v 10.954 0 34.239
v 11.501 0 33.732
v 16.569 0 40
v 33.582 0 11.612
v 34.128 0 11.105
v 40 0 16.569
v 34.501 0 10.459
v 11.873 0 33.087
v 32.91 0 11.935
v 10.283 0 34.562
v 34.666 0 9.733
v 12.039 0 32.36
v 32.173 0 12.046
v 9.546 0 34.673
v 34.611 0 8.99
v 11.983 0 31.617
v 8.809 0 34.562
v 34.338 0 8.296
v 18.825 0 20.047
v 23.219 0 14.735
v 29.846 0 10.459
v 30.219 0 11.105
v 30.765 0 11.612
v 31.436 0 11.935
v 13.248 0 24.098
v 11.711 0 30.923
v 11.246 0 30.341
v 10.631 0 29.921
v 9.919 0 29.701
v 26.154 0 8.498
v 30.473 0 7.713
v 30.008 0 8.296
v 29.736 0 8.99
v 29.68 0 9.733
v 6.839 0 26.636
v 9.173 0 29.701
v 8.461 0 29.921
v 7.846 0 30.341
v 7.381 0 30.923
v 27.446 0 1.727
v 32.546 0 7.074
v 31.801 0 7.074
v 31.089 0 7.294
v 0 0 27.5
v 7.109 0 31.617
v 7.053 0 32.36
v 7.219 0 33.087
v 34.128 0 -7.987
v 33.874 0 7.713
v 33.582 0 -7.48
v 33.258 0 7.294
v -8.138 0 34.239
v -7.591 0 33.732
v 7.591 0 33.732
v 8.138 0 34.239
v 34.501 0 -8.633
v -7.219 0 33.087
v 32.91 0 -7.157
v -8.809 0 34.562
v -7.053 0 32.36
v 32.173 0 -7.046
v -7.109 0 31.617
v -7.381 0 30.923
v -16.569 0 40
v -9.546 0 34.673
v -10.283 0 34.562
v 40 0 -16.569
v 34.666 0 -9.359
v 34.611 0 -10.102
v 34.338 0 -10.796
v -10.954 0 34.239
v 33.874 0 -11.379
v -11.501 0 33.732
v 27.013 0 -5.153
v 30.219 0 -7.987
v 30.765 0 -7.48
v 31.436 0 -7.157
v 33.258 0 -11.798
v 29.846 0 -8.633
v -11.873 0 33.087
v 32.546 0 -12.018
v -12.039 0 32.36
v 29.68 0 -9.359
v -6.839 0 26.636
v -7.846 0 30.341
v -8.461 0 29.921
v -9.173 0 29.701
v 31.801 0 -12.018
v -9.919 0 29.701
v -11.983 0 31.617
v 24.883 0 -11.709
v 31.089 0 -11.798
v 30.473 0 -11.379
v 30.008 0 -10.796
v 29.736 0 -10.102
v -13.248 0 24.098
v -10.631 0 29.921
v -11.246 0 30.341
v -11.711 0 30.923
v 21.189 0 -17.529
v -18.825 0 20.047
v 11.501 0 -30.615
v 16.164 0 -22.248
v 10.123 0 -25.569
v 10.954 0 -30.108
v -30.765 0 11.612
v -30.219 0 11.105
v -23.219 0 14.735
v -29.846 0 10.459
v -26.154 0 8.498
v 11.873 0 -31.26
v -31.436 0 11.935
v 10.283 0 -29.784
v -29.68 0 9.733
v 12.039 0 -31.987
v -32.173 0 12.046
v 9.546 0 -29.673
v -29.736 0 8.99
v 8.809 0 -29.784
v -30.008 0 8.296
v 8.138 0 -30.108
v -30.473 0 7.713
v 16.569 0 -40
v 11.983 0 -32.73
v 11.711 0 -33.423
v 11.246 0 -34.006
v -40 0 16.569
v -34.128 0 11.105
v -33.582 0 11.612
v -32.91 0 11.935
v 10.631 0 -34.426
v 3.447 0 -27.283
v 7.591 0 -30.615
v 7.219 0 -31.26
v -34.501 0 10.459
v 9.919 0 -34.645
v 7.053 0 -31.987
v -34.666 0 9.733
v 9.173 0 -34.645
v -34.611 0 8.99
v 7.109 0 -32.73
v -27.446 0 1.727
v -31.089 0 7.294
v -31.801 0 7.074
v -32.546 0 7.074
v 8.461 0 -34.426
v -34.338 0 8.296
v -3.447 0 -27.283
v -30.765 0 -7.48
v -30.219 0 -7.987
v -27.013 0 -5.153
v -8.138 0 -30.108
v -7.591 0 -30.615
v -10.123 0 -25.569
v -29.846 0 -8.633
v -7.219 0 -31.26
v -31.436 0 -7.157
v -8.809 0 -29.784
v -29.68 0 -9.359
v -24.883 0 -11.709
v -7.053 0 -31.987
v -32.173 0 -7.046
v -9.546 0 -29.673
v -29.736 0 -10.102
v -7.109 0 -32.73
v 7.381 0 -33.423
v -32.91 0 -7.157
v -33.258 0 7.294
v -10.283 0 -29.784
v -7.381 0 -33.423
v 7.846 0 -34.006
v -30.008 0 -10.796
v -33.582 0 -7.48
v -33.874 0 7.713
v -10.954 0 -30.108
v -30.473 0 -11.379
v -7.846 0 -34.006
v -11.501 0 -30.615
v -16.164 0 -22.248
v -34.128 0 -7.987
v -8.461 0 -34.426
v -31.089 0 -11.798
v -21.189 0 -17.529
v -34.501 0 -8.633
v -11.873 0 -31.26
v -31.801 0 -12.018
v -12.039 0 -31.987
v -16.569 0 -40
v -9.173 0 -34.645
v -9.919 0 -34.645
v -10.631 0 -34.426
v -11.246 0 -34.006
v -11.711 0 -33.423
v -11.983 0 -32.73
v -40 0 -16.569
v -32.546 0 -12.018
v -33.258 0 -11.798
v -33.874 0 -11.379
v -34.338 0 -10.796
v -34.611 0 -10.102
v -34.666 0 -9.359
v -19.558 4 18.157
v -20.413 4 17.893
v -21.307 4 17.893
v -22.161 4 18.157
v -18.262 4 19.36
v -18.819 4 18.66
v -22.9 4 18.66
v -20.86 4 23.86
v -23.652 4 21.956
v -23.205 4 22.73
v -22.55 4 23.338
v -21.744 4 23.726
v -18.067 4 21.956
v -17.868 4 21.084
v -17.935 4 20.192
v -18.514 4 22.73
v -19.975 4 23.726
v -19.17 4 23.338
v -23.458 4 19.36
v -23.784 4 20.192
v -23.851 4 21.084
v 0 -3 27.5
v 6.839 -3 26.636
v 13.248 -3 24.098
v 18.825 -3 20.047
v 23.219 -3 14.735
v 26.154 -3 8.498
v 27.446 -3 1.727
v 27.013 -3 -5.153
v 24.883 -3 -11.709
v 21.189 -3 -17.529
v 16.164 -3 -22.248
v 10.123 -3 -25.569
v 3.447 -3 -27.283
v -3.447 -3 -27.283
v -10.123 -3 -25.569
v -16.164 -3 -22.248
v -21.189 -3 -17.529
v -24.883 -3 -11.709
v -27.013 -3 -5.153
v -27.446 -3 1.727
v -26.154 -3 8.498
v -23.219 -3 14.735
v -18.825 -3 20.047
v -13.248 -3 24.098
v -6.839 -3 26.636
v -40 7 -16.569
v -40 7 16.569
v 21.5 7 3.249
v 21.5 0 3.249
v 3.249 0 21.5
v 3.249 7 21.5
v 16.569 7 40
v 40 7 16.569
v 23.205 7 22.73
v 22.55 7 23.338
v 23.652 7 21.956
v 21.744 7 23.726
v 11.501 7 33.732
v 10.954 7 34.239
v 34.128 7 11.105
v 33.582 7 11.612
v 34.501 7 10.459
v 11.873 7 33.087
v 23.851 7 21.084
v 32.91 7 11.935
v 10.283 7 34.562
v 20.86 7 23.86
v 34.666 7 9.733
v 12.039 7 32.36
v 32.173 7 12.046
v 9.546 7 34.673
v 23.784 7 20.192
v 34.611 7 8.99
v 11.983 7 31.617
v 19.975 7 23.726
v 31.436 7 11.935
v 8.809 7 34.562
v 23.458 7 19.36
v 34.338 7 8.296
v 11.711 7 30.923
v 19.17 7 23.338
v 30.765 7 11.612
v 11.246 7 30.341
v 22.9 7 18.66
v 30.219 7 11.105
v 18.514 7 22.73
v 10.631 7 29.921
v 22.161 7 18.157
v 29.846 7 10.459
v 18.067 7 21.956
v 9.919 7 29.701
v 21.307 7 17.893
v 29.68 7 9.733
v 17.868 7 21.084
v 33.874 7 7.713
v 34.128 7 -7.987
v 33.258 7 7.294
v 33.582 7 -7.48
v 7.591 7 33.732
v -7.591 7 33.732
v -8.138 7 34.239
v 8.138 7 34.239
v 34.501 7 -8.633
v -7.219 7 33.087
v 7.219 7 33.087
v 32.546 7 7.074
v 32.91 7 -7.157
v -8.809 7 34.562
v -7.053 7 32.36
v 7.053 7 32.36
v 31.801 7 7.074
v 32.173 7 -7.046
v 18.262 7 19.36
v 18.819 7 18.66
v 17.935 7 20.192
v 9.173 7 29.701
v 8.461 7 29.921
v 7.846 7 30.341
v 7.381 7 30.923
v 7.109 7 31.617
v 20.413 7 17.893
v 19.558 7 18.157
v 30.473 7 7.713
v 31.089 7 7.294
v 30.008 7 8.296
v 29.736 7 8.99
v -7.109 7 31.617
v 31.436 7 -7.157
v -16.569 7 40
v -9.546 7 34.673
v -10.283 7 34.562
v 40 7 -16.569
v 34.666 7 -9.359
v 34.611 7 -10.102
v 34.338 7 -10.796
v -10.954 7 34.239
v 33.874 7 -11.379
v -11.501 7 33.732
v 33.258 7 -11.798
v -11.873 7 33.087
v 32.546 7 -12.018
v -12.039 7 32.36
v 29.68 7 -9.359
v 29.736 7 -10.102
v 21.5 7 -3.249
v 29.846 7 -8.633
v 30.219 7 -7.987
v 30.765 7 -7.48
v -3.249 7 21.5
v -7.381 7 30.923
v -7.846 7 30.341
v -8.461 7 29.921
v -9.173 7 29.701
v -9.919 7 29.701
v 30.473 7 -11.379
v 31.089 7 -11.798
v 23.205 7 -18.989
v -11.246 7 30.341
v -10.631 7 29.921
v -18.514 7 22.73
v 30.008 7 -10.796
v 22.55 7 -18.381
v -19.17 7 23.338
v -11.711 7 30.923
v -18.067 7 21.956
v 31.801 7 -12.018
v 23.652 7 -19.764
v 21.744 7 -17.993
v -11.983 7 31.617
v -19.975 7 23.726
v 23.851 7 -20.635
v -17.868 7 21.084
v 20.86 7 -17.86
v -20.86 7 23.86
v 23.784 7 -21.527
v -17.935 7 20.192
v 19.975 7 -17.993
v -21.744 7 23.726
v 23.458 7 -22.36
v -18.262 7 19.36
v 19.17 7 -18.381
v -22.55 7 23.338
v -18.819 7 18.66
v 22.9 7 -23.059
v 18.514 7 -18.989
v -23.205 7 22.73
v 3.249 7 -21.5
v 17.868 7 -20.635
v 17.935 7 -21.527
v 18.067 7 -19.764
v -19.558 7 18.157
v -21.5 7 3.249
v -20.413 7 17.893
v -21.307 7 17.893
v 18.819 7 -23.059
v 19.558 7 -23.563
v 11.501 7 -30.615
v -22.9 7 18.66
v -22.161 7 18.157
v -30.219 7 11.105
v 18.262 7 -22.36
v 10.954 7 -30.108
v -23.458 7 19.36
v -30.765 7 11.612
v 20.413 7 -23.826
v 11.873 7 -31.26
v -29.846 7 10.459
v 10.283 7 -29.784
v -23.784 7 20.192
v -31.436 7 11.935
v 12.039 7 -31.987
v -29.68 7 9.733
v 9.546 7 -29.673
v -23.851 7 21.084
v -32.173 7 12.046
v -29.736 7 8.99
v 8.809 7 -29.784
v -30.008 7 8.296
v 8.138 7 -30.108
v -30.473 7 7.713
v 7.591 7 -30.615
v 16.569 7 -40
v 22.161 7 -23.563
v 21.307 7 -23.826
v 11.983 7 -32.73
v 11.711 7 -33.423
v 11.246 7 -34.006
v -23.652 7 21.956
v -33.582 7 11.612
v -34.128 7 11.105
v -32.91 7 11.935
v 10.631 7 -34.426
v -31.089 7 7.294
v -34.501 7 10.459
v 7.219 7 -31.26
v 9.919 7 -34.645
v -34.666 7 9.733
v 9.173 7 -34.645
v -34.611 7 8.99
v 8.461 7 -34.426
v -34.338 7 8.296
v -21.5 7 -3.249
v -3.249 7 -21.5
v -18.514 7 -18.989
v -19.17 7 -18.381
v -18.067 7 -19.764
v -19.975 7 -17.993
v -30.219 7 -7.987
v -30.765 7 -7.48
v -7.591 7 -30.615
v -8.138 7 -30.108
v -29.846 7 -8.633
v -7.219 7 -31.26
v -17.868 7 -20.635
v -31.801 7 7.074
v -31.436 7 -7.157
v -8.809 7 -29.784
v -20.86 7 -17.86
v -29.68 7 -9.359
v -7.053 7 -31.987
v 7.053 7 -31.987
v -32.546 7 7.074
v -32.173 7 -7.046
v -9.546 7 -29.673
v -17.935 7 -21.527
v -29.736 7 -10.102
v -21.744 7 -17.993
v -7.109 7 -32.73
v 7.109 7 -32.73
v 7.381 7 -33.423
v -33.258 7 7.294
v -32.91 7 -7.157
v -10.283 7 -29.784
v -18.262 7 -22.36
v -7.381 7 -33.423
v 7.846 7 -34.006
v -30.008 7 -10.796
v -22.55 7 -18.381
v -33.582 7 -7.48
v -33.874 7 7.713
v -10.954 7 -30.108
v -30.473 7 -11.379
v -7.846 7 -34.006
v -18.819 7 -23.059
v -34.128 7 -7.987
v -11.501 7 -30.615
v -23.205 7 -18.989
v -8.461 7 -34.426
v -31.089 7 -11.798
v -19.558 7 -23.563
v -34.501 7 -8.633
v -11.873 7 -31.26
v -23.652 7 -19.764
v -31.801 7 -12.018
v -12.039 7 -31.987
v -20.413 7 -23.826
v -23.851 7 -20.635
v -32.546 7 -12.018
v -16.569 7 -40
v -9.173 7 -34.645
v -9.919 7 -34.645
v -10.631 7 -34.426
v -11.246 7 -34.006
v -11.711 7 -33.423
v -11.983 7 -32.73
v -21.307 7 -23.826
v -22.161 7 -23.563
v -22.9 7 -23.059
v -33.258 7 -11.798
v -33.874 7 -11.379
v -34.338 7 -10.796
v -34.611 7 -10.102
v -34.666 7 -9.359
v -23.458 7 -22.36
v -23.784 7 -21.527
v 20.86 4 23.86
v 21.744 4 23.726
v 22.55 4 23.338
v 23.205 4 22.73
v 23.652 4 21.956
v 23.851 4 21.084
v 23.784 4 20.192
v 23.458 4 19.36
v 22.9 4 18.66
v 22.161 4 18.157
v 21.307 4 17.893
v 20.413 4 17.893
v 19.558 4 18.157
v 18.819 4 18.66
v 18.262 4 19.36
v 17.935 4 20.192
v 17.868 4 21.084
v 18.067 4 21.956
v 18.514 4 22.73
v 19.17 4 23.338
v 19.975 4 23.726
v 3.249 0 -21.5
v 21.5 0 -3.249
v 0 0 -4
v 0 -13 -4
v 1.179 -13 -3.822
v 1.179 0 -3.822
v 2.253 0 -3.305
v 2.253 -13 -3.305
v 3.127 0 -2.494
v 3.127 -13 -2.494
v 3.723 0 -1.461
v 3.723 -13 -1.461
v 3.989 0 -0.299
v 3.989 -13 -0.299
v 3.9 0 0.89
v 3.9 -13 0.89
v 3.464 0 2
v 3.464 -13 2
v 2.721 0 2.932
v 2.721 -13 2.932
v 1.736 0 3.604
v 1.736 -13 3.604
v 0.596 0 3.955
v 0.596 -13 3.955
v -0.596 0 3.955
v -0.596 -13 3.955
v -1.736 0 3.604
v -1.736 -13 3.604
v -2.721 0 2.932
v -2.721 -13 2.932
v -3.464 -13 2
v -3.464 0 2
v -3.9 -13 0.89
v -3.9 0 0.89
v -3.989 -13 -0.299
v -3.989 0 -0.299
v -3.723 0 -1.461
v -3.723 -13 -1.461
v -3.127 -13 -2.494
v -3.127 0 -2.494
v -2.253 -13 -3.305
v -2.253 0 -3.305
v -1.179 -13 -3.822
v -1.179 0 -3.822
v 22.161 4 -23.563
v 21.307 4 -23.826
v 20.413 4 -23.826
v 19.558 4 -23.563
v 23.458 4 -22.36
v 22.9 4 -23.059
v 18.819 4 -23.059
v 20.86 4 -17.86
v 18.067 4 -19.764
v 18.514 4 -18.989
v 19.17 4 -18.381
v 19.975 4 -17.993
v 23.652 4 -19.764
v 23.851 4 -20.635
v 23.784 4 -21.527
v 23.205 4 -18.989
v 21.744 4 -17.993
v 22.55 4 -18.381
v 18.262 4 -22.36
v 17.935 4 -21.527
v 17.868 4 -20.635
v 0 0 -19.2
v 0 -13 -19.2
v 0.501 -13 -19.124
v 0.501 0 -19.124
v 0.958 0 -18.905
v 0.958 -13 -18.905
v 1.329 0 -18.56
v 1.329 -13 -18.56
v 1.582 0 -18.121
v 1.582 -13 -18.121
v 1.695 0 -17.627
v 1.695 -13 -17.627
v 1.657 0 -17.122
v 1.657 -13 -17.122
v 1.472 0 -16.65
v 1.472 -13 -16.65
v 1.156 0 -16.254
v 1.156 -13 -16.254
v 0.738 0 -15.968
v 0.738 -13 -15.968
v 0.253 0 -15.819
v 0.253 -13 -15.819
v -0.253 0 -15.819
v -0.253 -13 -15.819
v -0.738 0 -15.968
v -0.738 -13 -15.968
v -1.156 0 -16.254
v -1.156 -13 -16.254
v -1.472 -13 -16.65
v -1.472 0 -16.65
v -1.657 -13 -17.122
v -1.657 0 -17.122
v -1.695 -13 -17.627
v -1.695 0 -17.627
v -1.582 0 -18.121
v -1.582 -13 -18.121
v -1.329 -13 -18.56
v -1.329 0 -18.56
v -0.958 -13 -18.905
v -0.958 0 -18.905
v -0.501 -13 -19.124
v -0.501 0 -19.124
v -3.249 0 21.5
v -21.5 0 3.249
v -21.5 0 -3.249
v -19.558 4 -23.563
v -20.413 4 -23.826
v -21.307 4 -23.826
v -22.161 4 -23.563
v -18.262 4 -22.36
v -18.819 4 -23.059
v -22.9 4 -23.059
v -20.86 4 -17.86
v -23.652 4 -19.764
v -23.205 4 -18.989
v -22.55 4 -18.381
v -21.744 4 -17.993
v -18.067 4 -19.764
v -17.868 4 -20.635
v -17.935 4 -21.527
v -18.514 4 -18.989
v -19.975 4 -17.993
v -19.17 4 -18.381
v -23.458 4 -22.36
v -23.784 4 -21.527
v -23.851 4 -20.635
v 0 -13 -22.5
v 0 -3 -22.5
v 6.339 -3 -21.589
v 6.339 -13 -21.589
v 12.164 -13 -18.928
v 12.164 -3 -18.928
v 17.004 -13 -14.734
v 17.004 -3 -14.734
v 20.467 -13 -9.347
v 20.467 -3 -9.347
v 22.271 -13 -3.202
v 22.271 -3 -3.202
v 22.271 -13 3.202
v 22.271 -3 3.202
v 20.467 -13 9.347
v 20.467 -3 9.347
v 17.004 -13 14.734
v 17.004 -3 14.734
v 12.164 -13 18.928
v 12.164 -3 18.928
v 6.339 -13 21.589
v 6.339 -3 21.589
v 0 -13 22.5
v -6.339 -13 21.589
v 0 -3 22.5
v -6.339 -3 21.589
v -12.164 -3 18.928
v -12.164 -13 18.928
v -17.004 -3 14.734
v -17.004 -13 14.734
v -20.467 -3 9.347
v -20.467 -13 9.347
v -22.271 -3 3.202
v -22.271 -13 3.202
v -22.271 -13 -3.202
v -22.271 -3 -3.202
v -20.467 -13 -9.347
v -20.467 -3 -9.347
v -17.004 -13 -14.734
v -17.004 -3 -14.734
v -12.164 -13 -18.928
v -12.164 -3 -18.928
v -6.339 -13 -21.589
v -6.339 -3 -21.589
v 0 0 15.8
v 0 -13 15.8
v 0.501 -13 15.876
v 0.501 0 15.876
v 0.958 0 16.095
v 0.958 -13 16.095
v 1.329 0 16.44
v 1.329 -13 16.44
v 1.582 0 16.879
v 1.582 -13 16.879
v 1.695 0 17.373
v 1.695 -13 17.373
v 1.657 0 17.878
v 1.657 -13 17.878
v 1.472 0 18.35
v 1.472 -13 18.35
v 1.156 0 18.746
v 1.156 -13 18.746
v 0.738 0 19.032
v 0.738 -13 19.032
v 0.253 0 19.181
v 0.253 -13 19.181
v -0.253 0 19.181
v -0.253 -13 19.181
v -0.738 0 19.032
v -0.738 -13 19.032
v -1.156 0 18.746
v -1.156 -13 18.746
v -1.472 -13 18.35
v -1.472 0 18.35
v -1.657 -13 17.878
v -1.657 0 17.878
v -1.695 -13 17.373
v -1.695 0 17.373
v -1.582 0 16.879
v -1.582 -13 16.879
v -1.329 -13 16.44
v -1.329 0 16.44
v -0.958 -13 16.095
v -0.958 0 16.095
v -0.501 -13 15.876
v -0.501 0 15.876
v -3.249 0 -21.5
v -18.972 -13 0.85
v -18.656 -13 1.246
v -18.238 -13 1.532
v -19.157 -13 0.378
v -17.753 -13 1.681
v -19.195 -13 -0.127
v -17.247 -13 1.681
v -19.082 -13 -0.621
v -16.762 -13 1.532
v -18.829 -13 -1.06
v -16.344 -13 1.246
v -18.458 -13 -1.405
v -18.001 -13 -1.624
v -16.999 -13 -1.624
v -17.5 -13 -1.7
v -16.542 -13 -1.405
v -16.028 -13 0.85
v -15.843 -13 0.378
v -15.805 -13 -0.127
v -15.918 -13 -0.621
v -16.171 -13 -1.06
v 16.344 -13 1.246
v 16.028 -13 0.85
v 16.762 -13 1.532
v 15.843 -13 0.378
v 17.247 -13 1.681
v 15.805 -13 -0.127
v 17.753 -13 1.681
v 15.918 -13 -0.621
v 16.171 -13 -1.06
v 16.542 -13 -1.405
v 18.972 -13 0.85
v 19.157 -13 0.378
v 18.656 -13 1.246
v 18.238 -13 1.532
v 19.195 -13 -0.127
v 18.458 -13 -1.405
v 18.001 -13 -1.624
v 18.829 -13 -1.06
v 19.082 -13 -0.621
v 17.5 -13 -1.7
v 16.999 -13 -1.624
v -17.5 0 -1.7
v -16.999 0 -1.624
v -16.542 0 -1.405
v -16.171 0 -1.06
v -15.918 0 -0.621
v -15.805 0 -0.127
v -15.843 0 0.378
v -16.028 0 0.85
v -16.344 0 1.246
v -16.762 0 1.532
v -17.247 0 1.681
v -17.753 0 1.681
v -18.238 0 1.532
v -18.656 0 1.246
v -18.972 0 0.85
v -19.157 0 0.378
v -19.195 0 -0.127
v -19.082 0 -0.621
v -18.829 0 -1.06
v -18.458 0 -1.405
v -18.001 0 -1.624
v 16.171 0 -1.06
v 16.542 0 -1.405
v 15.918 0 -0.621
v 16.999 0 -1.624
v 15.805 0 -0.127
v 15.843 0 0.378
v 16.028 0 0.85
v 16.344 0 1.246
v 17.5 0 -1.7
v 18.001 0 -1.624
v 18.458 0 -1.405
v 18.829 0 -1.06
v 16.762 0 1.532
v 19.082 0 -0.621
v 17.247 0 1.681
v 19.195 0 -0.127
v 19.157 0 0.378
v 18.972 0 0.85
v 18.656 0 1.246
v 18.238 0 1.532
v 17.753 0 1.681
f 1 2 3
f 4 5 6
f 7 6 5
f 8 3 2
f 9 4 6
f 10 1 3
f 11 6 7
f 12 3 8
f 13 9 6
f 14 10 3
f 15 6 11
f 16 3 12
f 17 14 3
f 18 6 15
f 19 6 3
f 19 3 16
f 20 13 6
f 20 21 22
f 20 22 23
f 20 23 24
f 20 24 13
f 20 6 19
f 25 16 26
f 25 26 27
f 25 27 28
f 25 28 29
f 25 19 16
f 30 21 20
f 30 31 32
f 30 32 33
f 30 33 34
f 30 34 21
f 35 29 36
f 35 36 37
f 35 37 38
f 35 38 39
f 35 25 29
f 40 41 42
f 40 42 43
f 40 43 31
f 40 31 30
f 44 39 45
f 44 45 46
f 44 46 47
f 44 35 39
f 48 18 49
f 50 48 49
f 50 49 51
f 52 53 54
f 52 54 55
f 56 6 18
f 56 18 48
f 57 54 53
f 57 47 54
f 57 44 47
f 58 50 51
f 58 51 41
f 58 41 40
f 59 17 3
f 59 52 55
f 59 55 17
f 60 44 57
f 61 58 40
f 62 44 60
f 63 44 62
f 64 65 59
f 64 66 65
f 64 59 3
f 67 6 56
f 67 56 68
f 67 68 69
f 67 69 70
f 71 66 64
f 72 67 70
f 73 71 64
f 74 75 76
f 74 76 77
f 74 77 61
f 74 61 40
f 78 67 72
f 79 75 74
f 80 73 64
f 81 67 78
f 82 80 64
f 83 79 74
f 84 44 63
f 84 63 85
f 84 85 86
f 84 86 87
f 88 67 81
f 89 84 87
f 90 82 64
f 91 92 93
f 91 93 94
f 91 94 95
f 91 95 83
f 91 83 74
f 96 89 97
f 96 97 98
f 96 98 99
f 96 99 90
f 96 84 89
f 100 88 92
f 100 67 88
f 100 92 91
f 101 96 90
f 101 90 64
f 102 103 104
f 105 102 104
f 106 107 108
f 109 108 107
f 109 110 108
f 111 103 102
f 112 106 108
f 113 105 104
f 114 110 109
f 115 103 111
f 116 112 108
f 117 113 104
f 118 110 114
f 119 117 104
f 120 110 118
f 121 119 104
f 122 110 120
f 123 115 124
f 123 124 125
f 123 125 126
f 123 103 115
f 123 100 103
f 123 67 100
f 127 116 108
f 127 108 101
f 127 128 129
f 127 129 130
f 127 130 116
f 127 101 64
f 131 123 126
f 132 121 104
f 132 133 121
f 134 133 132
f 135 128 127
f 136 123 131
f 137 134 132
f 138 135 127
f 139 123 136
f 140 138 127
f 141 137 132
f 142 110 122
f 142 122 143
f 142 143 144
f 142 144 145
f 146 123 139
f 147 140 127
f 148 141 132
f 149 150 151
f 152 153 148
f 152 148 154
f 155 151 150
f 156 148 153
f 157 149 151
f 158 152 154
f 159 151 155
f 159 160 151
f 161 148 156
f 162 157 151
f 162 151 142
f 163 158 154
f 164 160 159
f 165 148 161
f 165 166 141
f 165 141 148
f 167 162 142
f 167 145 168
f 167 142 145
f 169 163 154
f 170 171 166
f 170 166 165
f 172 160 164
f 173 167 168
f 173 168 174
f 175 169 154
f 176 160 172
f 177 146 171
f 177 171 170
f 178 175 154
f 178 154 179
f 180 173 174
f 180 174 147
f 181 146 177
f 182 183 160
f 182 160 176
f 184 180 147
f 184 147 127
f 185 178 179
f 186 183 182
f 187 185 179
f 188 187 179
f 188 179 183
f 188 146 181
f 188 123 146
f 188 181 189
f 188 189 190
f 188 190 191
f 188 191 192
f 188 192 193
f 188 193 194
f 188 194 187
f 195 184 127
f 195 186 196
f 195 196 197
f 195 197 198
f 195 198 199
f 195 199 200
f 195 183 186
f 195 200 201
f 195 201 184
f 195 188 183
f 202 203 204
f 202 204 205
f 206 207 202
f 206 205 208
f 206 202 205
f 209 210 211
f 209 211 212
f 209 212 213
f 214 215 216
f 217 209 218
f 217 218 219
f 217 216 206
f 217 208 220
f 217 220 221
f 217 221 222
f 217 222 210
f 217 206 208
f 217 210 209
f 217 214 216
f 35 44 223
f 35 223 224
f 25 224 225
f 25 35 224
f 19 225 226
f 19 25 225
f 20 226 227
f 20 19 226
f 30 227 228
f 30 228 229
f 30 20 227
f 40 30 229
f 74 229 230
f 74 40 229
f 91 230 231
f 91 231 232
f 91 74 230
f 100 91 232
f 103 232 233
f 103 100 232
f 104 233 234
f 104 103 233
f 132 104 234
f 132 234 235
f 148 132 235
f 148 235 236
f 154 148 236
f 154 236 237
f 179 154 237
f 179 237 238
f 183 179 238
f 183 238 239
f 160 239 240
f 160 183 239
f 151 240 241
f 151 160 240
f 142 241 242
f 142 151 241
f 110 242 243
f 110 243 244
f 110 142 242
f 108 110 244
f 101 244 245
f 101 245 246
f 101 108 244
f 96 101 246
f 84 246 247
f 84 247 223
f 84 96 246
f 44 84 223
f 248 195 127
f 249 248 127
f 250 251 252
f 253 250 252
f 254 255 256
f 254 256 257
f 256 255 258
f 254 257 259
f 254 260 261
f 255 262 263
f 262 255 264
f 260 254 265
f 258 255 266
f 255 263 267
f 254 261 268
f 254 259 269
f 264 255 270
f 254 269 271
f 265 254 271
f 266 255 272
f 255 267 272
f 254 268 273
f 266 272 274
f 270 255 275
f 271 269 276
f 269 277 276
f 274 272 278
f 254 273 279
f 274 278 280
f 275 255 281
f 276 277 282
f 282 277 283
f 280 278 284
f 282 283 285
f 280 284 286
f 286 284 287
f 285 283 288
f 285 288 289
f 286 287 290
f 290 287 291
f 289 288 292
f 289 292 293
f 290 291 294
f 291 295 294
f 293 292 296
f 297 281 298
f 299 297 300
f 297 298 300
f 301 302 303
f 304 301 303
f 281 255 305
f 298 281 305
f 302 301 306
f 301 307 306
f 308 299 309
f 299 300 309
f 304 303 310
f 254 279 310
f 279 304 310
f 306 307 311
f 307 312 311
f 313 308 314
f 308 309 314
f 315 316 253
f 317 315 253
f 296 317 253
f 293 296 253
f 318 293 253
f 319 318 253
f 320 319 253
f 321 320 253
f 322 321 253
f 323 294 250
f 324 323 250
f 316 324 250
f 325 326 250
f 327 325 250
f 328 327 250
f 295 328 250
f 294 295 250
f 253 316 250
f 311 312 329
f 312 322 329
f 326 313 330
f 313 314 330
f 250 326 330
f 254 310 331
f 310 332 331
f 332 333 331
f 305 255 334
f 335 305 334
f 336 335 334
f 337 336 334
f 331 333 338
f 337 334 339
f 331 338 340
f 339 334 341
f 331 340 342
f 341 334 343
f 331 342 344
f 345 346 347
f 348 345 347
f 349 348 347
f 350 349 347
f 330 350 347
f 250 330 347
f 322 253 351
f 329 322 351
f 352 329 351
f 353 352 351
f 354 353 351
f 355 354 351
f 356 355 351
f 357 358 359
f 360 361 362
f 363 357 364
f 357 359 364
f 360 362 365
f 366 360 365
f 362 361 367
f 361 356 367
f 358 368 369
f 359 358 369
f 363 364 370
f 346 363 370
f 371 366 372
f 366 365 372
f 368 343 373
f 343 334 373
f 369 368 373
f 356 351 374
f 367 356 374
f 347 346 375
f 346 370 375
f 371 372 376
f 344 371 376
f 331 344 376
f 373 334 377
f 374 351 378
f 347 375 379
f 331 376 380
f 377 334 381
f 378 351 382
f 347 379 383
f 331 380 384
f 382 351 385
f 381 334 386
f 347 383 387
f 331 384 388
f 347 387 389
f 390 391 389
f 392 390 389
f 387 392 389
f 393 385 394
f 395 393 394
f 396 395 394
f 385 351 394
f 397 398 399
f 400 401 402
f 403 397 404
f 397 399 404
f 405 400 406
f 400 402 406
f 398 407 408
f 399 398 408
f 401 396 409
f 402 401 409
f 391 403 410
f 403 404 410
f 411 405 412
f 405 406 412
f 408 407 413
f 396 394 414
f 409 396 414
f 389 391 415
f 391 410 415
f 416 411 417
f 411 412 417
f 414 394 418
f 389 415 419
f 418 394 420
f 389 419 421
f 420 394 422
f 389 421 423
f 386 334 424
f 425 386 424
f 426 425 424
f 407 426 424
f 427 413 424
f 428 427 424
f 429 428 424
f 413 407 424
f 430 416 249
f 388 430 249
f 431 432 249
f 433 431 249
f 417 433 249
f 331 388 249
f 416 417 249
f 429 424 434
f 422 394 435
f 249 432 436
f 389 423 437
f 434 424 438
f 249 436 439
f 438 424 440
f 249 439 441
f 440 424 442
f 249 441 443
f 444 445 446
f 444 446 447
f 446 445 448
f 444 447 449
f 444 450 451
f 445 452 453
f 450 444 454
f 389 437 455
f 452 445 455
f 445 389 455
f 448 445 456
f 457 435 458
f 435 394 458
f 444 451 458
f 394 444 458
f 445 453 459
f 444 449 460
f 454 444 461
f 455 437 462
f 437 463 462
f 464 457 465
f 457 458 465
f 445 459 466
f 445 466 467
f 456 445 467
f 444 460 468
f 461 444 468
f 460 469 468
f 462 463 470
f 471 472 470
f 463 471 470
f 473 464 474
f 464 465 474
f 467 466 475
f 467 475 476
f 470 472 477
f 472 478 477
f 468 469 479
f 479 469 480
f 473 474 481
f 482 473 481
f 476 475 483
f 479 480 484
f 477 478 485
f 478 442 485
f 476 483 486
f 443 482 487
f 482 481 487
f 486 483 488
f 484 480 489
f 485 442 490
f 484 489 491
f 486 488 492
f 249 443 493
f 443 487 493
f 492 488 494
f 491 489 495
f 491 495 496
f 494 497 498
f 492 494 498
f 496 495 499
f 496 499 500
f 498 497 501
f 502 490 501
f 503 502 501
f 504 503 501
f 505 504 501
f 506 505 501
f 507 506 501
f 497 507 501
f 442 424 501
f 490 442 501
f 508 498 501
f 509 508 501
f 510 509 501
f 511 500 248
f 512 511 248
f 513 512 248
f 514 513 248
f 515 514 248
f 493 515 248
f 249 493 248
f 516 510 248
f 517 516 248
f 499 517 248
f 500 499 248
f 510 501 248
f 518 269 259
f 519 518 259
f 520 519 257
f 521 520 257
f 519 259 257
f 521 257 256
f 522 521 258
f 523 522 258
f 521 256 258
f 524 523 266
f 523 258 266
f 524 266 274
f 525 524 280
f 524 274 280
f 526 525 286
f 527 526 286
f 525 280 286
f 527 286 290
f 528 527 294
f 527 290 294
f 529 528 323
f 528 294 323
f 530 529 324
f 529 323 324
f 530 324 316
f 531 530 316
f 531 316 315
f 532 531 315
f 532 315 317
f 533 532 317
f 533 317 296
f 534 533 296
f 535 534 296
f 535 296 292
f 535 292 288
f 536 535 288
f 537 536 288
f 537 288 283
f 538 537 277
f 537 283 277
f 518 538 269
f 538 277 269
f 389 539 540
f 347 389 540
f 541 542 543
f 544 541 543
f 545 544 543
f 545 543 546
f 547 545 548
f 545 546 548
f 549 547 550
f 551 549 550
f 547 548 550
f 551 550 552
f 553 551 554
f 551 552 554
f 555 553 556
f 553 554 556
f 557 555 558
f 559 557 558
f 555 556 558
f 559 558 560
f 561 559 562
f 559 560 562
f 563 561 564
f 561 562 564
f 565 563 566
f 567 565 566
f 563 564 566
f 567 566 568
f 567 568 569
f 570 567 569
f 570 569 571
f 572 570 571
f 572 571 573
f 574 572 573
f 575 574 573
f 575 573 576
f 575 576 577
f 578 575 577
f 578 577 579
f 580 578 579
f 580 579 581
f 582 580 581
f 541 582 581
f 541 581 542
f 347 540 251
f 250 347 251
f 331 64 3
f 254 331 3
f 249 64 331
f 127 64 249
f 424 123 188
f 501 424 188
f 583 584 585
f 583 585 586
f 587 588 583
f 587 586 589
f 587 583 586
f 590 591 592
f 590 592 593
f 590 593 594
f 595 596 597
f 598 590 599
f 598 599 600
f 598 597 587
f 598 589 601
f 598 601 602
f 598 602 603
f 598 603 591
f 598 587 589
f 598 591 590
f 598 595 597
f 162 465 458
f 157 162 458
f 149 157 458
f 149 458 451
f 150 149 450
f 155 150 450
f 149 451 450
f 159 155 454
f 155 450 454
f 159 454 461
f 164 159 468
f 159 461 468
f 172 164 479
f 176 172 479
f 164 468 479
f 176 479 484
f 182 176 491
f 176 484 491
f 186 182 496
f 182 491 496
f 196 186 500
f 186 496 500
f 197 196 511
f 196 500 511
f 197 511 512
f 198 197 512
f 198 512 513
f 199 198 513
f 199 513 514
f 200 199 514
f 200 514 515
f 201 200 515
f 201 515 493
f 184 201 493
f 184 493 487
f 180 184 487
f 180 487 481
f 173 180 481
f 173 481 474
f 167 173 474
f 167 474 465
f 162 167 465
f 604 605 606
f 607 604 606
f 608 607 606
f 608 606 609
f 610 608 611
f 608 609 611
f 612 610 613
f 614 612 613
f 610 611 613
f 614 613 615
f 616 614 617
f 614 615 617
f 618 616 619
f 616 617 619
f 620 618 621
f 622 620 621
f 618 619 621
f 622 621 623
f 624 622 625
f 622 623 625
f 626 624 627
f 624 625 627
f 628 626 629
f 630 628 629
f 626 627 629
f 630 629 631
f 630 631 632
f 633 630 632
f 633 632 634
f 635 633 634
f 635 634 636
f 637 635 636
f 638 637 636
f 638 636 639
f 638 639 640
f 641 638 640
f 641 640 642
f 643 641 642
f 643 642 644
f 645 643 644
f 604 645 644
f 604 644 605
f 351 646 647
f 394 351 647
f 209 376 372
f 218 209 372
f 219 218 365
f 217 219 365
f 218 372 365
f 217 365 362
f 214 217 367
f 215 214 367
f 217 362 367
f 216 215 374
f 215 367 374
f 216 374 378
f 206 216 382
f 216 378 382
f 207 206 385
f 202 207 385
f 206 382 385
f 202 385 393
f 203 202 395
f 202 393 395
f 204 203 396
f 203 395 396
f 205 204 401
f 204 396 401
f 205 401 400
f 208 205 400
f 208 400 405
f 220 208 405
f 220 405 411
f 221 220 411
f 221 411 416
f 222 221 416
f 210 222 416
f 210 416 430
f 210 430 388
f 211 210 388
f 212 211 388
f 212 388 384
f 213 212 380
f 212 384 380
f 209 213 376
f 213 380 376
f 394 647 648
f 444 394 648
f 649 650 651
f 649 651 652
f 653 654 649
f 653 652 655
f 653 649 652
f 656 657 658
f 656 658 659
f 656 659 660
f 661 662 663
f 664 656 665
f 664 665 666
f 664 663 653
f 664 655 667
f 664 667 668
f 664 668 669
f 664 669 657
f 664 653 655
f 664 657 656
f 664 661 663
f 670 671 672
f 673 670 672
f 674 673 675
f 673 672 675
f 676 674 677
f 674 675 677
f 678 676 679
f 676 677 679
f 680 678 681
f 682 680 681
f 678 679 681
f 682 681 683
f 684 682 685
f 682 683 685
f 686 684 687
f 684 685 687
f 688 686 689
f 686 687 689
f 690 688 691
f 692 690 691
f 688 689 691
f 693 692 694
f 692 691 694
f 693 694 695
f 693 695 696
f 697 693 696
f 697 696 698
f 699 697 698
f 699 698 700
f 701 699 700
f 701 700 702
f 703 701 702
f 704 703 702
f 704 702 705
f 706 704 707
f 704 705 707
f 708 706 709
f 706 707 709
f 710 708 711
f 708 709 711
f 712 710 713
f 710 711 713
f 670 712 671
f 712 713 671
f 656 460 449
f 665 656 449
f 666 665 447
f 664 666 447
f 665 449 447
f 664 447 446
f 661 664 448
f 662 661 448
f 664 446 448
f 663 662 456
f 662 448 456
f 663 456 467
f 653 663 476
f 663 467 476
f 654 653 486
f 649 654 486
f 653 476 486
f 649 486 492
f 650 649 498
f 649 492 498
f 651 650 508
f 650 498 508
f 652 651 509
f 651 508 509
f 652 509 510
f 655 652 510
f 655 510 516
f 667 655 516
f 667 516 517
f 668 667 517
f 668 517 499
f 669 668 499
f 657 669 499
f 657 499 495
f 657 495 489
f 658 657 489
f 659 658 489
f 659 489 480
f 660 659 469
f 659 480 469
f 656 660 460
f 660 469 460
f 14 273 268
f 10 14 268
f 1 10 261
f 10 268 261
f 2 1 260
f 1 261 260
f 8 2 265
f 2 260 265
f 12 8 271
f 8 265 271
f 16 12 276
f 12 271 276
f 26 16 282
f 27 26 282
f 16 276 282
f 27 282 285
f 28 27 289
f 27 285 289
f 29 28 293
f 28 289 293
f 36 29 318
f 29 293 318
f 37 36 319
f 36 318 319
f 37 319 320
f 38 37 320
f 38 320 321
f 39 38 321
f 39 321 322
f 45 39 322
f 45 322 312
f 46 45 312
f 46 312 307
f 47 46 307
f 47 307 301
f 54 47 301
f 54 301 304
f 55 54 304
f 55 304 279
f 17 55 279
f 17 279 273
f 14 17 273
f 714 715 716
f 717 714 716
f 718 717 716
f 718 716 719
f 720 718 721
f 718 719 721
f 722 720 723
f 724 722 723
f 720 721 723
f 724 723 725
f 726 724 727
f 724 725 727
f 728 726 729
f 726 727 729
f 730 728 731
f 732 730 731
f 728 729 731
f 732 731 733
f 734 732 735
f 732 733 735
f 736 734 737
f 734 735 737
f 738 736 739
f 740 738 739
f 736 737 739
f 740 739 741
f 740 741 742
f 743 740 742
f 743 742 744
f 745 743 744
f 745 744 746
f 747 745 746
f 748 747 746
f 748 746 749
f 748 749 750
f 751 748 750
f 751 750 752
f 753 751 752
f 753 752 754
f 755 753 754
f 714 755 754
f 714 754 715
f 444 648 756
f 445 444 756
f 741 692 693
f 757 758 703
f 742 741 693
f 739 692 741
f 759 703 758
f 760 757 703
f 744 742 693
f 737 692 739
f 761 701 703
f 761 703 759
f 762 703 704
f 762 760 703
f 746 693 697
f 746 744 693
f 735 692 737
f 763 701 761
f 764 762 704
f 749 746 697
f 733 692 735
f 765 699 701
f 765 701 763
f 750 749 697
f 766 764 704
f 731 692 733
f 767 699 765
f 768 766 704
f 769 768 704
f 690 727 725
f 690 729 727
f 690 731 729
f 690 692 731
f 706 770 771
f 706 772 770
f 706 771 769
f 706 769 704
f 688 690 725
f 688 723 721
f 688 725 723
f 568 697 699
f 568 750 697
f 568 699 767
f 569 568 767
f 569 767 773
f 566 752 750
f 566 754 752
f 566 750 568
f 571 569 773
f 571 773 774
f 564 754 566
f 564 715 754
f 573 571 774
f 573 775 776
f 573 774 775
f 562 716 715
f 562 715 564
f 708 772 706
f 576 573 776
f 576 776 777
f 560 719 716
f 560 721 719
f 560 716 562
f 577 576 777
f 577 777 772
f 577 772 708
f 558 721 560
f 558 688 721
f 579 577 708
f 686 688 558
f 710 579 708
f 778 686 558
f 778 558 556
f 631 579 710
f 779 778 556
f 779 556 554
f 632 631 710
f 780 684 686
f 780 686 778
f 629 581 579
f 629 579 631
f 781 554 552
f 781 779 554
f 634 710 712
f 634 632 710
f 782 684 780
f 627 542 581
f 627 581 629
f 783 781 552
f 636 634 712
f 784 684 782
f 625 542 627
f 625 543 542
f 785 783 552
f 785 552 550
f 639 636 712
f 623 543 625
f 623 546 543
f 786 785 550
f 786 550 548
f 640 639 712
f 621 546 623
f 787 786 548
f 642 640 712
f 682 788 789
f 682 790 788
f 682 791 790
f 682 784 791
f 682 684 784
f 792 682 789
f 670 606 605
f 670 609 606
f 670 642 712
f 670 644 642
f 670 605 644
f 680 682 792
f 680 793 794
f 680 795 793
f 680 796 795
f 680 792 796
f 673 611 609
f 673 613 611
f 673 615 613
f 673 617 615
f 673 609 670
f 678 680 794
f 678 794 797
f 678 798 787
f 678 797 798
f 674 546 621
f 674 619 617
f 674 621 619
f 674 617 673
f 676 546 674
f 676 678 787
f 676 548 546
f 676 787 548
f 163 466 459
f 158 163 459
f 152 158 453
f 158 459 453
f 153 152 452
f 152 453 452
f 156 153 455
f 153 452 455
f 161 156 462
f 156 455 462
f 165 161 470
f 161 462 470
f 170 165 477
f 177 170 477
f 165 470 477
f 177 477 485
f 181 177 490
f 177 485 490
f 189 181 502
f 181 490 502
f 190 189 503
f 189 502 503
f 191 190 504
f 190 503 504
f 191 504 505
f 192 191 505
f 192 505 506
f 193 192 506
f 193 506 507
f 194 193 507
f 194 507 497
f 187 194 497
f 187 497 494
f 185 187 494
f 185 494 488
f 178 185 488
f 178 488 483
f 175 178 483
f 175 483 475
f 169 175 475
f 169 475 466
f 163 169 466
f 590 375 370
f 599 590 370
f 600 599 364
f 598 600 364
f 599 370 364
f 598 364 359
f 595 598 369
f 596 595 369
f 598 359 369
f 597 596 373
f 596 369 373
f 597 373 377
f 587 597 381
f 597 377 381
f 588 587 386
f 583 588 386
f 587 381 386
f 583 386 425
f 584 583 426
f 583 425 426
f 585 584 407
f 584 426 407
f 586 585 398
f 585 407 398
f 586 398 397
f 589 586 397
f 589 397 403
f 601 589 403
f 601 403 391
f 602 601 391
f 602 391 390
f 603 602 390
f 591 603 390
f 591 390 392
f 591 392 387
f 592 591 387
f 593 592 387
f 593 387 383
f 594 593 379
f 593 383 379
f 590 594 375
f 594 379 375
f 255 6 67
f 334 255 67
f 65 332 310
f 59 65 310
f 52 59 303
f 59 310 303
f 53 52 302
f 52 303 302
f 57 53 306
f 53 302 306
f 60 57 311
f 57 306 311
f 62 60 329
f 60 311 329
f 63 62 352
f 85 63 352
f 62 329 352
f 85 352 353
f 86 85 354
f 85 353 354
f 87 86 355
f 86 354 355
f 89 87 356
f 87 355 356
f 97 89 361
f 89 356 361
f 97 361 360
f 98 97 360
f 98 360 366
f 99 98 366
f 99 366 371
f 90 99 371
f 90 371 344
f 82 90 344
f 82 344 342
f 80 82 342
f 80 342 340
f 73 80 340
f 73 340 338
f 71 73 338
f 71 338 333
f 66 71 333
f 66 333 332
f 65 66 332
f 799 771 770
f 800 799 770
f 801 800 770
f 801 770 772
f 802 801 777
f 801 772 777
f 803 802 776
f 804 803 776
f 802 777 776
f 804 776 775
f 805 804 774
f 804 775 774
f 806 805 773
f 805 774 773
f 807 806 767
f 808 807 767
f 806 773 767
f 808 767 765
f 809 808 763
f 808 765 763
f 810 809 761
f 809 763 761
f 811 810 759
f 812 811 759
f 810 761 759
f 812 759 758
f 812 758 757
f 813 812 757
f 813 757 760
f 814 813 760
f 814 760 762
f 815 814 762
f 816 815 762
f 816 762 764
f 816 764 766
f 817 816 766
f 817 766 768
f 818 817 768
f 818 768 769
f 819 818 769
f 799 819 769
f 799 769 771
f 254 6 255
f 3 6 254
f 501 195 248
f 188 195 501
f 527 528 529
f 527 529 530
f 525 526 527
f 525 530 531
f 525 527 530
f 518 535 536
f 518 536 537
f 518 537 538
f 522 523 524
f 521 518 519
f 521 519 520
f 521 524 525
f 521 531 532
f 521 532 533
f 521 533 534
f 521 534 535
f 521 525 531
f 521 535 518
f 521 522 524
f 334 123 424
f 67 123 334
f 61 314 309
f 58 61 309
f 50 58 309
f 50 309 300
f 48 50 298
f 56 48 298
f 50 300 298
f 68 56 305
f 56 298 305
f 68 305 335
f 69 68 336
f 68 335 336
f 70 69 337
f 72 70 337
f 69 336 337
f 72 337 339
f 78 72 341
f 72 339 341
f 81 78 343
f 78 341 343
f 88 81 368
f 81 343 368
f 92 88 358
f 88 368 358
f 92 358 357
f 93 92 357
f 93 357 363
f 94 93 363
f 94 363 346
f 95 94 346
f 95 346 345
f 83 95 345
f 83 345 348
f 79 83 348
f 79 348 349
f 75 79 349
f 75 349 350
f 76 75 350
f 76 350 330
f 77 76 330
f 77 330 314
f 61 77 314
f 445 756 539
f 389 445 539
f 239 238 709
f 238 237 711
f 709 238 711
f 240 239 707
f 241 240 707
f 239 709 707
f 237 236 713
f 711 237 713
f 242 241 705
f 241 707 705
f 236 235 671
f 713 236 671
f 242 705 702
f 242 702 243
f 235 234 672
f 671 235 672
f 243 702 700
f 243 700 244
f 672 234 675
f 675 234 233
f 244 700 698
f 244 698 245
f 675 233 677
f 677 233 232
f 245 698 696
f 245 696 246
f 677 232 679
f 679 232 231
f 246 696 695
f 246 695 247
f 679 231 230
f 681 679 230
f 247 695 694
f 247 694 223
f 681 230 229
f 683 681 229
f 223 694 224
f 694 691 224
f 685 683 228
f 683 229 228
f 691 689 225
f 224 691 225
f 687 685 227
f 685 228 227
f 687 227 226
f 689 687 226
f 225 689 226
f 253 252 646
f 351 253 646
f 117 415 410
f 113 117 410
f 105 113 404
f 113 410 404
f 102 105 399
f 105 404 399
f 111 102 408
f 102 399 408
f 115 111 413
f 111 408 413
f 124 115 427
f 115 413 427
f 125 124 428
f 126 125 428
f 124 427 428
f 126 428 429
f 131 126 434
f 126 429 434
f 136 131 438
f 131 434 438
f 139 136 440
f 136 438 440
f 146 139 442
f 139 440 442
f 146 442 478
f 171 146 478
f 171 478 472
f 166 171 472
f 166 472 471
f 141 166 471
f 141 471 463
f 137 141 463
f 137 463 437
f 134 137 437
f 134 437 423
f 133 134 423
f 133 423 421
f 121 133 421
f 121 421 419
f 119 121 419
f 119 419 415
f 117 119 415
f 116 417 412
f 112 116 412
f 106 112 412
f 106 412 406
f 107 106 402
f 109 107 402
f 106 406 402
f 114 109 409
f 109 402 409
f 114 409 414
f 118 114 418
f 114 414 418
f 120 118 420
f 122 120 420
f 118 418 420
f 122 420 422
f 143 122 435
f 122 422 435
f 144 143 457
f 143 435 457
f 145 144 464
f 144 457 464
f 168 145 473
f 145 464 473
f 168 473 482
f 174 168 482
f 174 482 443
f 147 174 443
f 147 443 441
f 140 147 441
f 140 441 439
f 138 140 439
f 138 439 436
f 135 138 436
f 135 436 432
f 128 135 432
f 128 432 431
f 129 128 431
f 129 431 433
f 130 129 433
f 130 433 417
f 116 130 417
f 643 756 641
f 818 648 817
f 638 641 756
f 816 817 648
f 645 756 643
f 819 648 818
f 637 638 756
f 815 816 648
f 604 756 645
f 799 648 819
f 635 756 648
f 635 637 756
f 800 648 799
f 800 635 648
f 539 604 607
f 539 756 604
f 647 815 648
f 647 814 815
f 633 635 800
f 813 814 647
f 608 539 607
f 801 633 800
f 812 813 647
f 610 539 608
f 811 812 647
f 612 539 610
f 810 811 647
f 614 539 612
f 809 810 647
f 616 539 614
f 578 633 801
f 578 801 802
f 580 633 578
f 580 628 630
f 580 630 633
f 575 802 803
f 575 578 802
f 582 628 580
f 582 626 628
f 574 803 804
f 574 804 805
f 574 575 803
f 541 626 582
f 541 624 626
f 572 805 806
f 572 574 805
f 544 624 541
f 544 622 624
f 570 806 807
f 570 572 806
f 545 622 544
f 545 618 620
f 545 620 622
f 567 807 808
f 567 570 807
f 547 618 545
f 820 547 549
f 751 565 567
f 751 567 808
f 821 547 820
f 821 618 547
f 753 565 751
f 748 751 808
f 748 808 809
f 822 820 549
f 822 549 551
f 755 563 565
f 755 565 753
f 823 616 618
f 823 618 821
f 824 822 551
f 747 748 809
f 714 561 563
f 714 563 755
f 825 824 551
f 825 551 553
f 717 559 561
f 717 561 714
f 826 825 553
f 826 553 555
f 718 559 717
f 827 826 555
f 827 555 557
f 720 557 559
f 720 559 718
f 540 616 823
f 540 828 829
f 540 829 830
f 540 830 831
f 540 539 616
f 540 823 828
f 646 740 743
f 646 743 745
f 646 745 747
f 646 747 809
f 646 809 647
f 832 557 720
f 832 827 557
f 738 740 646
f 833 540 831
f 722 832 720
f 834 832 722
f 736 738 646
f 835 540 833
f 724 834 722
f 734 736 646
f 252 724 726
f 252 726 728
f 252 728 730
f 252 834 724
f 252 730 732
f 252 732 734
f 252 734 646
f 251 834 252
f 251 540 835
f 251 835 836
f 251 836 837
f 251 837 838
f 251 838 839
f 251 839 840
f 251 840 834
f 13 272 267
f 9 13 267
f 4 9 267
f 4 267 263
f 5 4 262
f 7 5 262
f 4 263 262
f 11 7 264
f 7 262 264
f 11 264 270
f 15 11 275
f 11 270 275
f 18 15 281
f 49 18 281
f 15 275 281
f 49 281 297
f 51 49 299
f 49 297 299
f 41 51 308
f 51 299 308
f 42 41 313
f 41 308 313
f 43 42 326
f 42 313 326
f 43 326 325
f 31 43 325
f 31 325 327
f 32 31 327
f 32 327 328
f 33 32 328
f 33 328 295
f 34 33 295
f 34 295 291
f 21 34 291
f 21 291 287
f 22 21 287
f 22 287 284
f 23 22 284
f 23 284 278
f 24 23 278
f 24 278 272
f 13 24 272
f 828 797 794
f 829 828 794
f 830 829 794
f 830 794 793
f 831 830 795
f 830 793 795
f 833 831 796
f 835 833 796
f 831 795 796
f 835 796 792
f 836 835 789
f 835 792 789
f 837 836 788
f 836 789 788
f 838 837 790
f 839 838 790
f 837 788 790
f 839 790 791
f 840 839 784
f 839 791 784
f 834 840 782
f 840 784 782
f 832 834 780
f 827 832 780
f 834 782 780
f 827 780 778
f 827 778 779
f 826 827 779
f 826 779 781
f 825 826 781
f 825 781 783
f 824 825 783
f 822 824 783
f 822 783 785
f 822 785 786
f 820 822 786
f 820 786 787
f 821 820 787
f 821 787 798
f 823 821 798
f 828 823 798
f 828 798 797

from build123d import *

# Parameters (mm, degrees)
SKETCH_1_R          = 27.5
EXTRUDE_1_DEPTH     = 3
SKETCH_2_R          = 22.5
EXTRUDE_2_DEPTH     = 10
CUT_EXTRUDE_1_REACH = 43.006
SKETCH_3_R          = 1.7
SKETCH_3_R_2        = 4
EXTRUDE_3_DEPTH     = 7
SKETCH_6_R          = 3
CUT_EXTRUDE_2_DEPTH = 3
CUT_EXTRUDE_3_REACH = 62
SKETCH_7_R          = 2.5


with BuildPart() as part:
    # 草图1 → 凸台-拉伸1 (new body)
    with BuildSketch(Plane(origin=(0, 0, 0), x_dir=(1, 0, 0), z_dir=(0, 1, 0))):
        with Locations(Location((0, 0, 0), (0, 0, 270))):
            Circle(SKETCH_1_R)
    extrude(amount=-EXTRUDE_1_DEPTH)

    # 草图2 → 凸台-拉伸2 (add)
    with BuildSketch(Plane.XZ.offset(3)):
        with Locations(Location((0, 0, 0), (0, 0, 270))):
            Circle(SKETCH_2_R)
    extrude(amount=EXTRUDE_2_DEPTH)

    # 草图3 → 切除-拉伸1 (cut, up to next)
    with BuildSketch(Plane.XZ.offset(13), mode=Mode.PRIVATE) as cut_extrude_1_sk1:
        with Locations(Location((0, 17.5, 0), (0, 0, 270))):
            Circle(SKETCH_3_R)
    cut_extrude_1_tool1 = extrude(cut_extrude_1_sk1.sketch, amount=-CUT_EXTRUDE_1_REACH, mode=Mode.PRIVATE) & part.part
    # 草图3 → 切除-拉伸1 (cut, up to next)
    with BuildSketch(Plane.XZ.offset(13), mode=Mode.PRIVATE) as cut_extrude_1_sk2:
        with Locations(Location((17.5, 0, 0), (0, 0, 270))):
            Circle(SKETCH_3_R)
    cut_extrude_1_tool2 = extrude(cut_extrude_1_sk2.sketch, amount=-CUT_EXTRUDE_1_REACH, mode=Mode.PRIVATE) & part.part
    # 草图3 → 切除-拉伸1 (cut, up to next)
    with BuildSketch(Plane.XZ.offset(13), mode=Mode.PRIVATE) as cut_extrude_1_sk3:
        with Locations(Location((0, -17.5, 0), (0, 0, 270))):
            Circle(SKETCH_3_R)
    cut_extrude_1_tool3 = extrude(cut_extrude_1_sk3.sketch, amount=-CUT_EXTRUDE_1_REACH, mode=Mode.PRIVATE) & part.part
    # 草图3 → 切除-拉伸1 (cut, up to next)
    with BuildSketch(Plane.XZ.offset(13), mode=Mode.PRIVATE) as cut_extrude_1_sk4:
        with Locations(Location((-17.5, 0, 0), (0, 0, 270))):
            Circle(SKETCH_3_R)
    cut_extrude_1_tool4 = extrude(cut_extrude_1_sk4.sketch, amount=-CUT_EXTRUDE_1_REACH, mode=Mode.PRIVATE) & part.part
    # 草图3 → 切除-拉伸1 (cut, up to next)
    with BuildSketch(Plane.XZ.offset(13), mode=Mode.PRIVATE) as cut_extrude_1_sk5:
        with Locations(Location((0, 0, 0), (0, 0, 270))):
            Circle(SKETCH_3_R_2)
    cut_extrude_1_tool5 = extrude(cut_extrude_1_sk5.sketch, amount=-CUT_EXTRUDE_1_REACH, mode=Mode.PRIVATE) & part.part
    add(cut_extrude_1_tool1.solids().sort_by_distance((0, -13, 17.5))[0], mode=Mode.SUBTRACT)
    add(cut_extrude_1_tool2.solids().sort_by_distance((17.5, -13, 0))[0], mode=Mode.SUBTRACT)
    add(cut_extrude_1_tool3.solids().sort_by_distance((0, -13, -17.5))[0], mode=Mode.SUBTRACT)
    add(cut_extrude_1_tool4.solids().sort_by_distance((-17.5, -13, 0))[0], mode=Mode.SUBTRACT)
    add(cut_extrude_1_tool5.solids().sort_by_distance((0, -13, 0))[0], mode=Mode.SUBTRACT)

    # 草图4 → 凸台-拉伸3 (add)
    with BuildSketch(Plane(origin=(0, 0, 0), x_dir=(1, 0, 0), z_dir=(0, 1, 0))):
        Polygon((0, 40), (16.568542495, 40), (40, 16.568542495), (40, 0), (40, -16.568542495), (16.568542495, -40), (0, -40), (-16.568542495, -40), (-40, -16.568542495), (-40, 0), (-40, 16.568542495), (-16.568542495, 40), align=None)
        Polygon((0, 21.5), (3.248737342, 21.5), (21.5, 3.248737342), (21.5, 0), (21.5, -3.248737342), (3.248737342, -21.5), (0, -21.5), (-3.248737342, -21.5), (-21.5, -3.248737342), (-21.5, 0), (-21.5, 3.248737342), (-3.248737342, 21.5), align=None, mode=Mode.SUBTRACT)
    extrude(amount=EXTRUDE_3_DEPTH)

    # 草图6 → 切除-拉伸2 (cut)
    with BuildSketch(Plane(origin=(0, 7, 0), x_dir=(1, 0, 0), z_dir=(0, 1, 0))):
        with Locations(Location((20.859650045, 20.859650045, 0), (0, 0, 270))):
            Circle(SKETCH_6_R)
        with Locations(Location((20.859650045, -20.859650045, 0), (0, 0, 270))):
            Circle(SKETCH_6_R)
        with Locations(Location((-20.859650045, -20.859650045, 0), (0, 0, 270))):
            Circle(SKETCH_6_R)
        with Locations(Location((-20.859650045, 20.859650045, 0), (0, 0, 270))):
            Circle(SKETCH_6_R)
    extrude(amount=-CUT_EXTRUDE_2_DEPTH, mode=Mode.SUBTRACT)

    # 草图7 → 切除-拉伸3 (cut, up to next)
    with BuildSketch(Plane(origin=(0, 7, 0), x_dir=(1, 0, 0), z_dir=(0, 1, 0)), mode=Mode.PRIVATE) as cut_extrude_3_sk1:
        with Locations(Location((9.545941546, 32.173358544, 0), (0, 0, 270))):
            Circle(SKETCH_7_R)
    cut_extrude_3_tool1 = extrude(cut_extrude_3_sk1.sketch, amount=-CUT_EXTRUDE_3_REACH, mode=Mode.PRIVATE) & part.part
    # 草图7 → 切除-拉伸3 (cut, up to next)
    with BuildSketch(Plane(origin=(0, 7, 0), x_dir=(1, 0, 0), z_dir=(0, 1, 0)), mode=Mode.PRIVATE) as cut_extrude_3_sk2:
        with Locations(Location((32.173358544, 9.545941546, 0), (0, 0, 270))):
            Circle(SKETCH_7_R)
    cut_extrude_3_tool2 = extrude(cut_extrude_3_sk2.sketch, amount=-CUT_EXTRUDE_3_REACH, mode=Mode.PRIVATE) & part.part
    # 草图7 → 切除-拉伸3 (cut, up to next)
    with BuildSketch(Plane(origin=(0, 7, 0), x_dir=(1, 0, 0), z_dir=(0, 1, 0)), mode=Mode.PRIVATE) as cut_extrude_3_sk3:
        with Locations(Location((32.173358544, -9.545941546, 0), (0, 0, 270))):
            Circle(SKETCH_7_R)
    cut_extrude_3_tool3 = extrude(cut_extrude_3_sk3.sketch, amount=-CUT_EXTRUDE_3_REACH, mode=Mode.PRIVATE) & part.part
    # 草图7 → 切除-拉伸3 (cut, up to next)
    with BuildSketch(Plane(origin=(0, 7, 0), x_dir=(1, 0, 0), z_dir=(0, 1, 0)), mode=Mode.PRIVATE) as cut_extrude_3_sk4:
        with Locations(Location((9.545941546, -32.173358544, 0), (0, 0, 270))):
            Circle(SKETCH_7_R)
    cut_extrude_3_tool4 = extrude(cut_extrude_3_sk4.sketch, amount=-CUT_EXTRUDE_3_REACH, mode=Mode.PRIVATE) & part.part
    # 草图7 → 切除-拉伸3 (cut, up to next)
    with BuildSketch(Plane(origin=(0, 7, 0), x_dir=(1, 0, 0), z_dir=(0, 1, 0)), mode=Mode.PRIVATE) as cut_extrude_3_sk5:
        with Locations(Location((-9.545941546, -32.173358544, 0), (0, 0, 270))):
            Circle(SKETCH_7_R)
    cut_extrude_3_tool5 = extrude(cut_extrude_3_sk5.sketch, amount=-CUT_EXTRUDE_3_REACH, mode=Mode.PRIVATE) & part.part
    # 草图7 → 切除-拉伸3 (cut, up to next)
    with BuildSketch(Plane(origin=(0, 7, 0), x_dir=(1, 0, 0), z_dir=(0, 1, 0)), mode=Mode.PRIVATE) as cut_extrude_3_sk6:
        with Locations(Location((-32.173358544, -9.545941546, 0), (0, 0, 270))):
            Circle(SKETCH_7_R)
    cut_extrude_3_tool6 = extrude(cut_extrude_3_sk6.sketch, amount=-CUT_EXTRUDE_3_REACH, mode=Mode.PRIVATE) & part.part
    # 草图7 → 切除-拉伸3 (cut, up to next)
    with BuildSketch(Plane(origin=(0, 7, 0), x_dir=(1, 0, 0), z_dir=(0, 1, 0)), mode=Mode.PRIVATE) as cut_extrude_3_sk7:
        with Locations(Location((-32.173358544, 9.545941546, 0), (0, 0, 270))):
            Circle(SKETCH_7_R)
    cut_extrude_3_tool7 = extrude(cut_extrude_3_sk7.sketch, amount=-CUT_EXTRUDE_3_REACH, mode=Mode.PRIVATE) & part.part
    # 草图7 → 切除-拉伸3 (cut, up to next)
    with BuildSketch(Plane(origin=(0, 7, 0), x_dir=(1, 0, 0), z_dir=(0, 1, 0)), mode=Mode.PRIVATE) as cut_extrude_3_sk8:
        with Locations(Location((-9.545941546, 32.173358544, 0), (0, 0, 270))):
            Circle(SKETCH_7_R)
    cut_extrude_3_tool8 = extrude(cut_extrude_3_sk8.sketch, amount=-CUT_EXTRUDE_3_REACH, mode=Mode.PRIVATE) & part.part
    add(cut_extrude_3_tool1.solids().sort_by_distance((9.545942, 7, -32.173359))[0], mode=Mode.SUBTRACT)
    add(cut_extrude_3_tool2.solids().sort_by_distance((32.173359, 7, -9.545942))[0], mode=Mode.SUBTRACT)
    add(cut_extrude_3_tool3.solids().sort_by_distance((32.173359, 7, 9.545942))[0], mode=Mode.SUBTRACT)
    add(cut_extrude_3_tool4.solids().sort_by_distance((9.545942, 7, 32.173359))[0], mode=Mode.SUBTRACT)
    add(cut_extrude_3_tool5.solids().sort_by_distance((-9.545942, 7, 32.173359))[0], mode=Mode.SUBTRACT)
    add(cut_extrude_3_tool6.solids().sort_by_distance((-32.173359, 7, 9.545942))[0], mode=Mode.SUBTRACT)
    add(cut_extrude_3_tool7.solids().sort_by_distance((-32.173359, 7, -9.545942))[0], mode=Mode.SUBTRACT)
    add(cut_extrude_3_tool8.solids().sort_by_distance((-9.545942, 7, -32.173359))[0], mode=Mode.SUBTRACT)


solid = part.part
